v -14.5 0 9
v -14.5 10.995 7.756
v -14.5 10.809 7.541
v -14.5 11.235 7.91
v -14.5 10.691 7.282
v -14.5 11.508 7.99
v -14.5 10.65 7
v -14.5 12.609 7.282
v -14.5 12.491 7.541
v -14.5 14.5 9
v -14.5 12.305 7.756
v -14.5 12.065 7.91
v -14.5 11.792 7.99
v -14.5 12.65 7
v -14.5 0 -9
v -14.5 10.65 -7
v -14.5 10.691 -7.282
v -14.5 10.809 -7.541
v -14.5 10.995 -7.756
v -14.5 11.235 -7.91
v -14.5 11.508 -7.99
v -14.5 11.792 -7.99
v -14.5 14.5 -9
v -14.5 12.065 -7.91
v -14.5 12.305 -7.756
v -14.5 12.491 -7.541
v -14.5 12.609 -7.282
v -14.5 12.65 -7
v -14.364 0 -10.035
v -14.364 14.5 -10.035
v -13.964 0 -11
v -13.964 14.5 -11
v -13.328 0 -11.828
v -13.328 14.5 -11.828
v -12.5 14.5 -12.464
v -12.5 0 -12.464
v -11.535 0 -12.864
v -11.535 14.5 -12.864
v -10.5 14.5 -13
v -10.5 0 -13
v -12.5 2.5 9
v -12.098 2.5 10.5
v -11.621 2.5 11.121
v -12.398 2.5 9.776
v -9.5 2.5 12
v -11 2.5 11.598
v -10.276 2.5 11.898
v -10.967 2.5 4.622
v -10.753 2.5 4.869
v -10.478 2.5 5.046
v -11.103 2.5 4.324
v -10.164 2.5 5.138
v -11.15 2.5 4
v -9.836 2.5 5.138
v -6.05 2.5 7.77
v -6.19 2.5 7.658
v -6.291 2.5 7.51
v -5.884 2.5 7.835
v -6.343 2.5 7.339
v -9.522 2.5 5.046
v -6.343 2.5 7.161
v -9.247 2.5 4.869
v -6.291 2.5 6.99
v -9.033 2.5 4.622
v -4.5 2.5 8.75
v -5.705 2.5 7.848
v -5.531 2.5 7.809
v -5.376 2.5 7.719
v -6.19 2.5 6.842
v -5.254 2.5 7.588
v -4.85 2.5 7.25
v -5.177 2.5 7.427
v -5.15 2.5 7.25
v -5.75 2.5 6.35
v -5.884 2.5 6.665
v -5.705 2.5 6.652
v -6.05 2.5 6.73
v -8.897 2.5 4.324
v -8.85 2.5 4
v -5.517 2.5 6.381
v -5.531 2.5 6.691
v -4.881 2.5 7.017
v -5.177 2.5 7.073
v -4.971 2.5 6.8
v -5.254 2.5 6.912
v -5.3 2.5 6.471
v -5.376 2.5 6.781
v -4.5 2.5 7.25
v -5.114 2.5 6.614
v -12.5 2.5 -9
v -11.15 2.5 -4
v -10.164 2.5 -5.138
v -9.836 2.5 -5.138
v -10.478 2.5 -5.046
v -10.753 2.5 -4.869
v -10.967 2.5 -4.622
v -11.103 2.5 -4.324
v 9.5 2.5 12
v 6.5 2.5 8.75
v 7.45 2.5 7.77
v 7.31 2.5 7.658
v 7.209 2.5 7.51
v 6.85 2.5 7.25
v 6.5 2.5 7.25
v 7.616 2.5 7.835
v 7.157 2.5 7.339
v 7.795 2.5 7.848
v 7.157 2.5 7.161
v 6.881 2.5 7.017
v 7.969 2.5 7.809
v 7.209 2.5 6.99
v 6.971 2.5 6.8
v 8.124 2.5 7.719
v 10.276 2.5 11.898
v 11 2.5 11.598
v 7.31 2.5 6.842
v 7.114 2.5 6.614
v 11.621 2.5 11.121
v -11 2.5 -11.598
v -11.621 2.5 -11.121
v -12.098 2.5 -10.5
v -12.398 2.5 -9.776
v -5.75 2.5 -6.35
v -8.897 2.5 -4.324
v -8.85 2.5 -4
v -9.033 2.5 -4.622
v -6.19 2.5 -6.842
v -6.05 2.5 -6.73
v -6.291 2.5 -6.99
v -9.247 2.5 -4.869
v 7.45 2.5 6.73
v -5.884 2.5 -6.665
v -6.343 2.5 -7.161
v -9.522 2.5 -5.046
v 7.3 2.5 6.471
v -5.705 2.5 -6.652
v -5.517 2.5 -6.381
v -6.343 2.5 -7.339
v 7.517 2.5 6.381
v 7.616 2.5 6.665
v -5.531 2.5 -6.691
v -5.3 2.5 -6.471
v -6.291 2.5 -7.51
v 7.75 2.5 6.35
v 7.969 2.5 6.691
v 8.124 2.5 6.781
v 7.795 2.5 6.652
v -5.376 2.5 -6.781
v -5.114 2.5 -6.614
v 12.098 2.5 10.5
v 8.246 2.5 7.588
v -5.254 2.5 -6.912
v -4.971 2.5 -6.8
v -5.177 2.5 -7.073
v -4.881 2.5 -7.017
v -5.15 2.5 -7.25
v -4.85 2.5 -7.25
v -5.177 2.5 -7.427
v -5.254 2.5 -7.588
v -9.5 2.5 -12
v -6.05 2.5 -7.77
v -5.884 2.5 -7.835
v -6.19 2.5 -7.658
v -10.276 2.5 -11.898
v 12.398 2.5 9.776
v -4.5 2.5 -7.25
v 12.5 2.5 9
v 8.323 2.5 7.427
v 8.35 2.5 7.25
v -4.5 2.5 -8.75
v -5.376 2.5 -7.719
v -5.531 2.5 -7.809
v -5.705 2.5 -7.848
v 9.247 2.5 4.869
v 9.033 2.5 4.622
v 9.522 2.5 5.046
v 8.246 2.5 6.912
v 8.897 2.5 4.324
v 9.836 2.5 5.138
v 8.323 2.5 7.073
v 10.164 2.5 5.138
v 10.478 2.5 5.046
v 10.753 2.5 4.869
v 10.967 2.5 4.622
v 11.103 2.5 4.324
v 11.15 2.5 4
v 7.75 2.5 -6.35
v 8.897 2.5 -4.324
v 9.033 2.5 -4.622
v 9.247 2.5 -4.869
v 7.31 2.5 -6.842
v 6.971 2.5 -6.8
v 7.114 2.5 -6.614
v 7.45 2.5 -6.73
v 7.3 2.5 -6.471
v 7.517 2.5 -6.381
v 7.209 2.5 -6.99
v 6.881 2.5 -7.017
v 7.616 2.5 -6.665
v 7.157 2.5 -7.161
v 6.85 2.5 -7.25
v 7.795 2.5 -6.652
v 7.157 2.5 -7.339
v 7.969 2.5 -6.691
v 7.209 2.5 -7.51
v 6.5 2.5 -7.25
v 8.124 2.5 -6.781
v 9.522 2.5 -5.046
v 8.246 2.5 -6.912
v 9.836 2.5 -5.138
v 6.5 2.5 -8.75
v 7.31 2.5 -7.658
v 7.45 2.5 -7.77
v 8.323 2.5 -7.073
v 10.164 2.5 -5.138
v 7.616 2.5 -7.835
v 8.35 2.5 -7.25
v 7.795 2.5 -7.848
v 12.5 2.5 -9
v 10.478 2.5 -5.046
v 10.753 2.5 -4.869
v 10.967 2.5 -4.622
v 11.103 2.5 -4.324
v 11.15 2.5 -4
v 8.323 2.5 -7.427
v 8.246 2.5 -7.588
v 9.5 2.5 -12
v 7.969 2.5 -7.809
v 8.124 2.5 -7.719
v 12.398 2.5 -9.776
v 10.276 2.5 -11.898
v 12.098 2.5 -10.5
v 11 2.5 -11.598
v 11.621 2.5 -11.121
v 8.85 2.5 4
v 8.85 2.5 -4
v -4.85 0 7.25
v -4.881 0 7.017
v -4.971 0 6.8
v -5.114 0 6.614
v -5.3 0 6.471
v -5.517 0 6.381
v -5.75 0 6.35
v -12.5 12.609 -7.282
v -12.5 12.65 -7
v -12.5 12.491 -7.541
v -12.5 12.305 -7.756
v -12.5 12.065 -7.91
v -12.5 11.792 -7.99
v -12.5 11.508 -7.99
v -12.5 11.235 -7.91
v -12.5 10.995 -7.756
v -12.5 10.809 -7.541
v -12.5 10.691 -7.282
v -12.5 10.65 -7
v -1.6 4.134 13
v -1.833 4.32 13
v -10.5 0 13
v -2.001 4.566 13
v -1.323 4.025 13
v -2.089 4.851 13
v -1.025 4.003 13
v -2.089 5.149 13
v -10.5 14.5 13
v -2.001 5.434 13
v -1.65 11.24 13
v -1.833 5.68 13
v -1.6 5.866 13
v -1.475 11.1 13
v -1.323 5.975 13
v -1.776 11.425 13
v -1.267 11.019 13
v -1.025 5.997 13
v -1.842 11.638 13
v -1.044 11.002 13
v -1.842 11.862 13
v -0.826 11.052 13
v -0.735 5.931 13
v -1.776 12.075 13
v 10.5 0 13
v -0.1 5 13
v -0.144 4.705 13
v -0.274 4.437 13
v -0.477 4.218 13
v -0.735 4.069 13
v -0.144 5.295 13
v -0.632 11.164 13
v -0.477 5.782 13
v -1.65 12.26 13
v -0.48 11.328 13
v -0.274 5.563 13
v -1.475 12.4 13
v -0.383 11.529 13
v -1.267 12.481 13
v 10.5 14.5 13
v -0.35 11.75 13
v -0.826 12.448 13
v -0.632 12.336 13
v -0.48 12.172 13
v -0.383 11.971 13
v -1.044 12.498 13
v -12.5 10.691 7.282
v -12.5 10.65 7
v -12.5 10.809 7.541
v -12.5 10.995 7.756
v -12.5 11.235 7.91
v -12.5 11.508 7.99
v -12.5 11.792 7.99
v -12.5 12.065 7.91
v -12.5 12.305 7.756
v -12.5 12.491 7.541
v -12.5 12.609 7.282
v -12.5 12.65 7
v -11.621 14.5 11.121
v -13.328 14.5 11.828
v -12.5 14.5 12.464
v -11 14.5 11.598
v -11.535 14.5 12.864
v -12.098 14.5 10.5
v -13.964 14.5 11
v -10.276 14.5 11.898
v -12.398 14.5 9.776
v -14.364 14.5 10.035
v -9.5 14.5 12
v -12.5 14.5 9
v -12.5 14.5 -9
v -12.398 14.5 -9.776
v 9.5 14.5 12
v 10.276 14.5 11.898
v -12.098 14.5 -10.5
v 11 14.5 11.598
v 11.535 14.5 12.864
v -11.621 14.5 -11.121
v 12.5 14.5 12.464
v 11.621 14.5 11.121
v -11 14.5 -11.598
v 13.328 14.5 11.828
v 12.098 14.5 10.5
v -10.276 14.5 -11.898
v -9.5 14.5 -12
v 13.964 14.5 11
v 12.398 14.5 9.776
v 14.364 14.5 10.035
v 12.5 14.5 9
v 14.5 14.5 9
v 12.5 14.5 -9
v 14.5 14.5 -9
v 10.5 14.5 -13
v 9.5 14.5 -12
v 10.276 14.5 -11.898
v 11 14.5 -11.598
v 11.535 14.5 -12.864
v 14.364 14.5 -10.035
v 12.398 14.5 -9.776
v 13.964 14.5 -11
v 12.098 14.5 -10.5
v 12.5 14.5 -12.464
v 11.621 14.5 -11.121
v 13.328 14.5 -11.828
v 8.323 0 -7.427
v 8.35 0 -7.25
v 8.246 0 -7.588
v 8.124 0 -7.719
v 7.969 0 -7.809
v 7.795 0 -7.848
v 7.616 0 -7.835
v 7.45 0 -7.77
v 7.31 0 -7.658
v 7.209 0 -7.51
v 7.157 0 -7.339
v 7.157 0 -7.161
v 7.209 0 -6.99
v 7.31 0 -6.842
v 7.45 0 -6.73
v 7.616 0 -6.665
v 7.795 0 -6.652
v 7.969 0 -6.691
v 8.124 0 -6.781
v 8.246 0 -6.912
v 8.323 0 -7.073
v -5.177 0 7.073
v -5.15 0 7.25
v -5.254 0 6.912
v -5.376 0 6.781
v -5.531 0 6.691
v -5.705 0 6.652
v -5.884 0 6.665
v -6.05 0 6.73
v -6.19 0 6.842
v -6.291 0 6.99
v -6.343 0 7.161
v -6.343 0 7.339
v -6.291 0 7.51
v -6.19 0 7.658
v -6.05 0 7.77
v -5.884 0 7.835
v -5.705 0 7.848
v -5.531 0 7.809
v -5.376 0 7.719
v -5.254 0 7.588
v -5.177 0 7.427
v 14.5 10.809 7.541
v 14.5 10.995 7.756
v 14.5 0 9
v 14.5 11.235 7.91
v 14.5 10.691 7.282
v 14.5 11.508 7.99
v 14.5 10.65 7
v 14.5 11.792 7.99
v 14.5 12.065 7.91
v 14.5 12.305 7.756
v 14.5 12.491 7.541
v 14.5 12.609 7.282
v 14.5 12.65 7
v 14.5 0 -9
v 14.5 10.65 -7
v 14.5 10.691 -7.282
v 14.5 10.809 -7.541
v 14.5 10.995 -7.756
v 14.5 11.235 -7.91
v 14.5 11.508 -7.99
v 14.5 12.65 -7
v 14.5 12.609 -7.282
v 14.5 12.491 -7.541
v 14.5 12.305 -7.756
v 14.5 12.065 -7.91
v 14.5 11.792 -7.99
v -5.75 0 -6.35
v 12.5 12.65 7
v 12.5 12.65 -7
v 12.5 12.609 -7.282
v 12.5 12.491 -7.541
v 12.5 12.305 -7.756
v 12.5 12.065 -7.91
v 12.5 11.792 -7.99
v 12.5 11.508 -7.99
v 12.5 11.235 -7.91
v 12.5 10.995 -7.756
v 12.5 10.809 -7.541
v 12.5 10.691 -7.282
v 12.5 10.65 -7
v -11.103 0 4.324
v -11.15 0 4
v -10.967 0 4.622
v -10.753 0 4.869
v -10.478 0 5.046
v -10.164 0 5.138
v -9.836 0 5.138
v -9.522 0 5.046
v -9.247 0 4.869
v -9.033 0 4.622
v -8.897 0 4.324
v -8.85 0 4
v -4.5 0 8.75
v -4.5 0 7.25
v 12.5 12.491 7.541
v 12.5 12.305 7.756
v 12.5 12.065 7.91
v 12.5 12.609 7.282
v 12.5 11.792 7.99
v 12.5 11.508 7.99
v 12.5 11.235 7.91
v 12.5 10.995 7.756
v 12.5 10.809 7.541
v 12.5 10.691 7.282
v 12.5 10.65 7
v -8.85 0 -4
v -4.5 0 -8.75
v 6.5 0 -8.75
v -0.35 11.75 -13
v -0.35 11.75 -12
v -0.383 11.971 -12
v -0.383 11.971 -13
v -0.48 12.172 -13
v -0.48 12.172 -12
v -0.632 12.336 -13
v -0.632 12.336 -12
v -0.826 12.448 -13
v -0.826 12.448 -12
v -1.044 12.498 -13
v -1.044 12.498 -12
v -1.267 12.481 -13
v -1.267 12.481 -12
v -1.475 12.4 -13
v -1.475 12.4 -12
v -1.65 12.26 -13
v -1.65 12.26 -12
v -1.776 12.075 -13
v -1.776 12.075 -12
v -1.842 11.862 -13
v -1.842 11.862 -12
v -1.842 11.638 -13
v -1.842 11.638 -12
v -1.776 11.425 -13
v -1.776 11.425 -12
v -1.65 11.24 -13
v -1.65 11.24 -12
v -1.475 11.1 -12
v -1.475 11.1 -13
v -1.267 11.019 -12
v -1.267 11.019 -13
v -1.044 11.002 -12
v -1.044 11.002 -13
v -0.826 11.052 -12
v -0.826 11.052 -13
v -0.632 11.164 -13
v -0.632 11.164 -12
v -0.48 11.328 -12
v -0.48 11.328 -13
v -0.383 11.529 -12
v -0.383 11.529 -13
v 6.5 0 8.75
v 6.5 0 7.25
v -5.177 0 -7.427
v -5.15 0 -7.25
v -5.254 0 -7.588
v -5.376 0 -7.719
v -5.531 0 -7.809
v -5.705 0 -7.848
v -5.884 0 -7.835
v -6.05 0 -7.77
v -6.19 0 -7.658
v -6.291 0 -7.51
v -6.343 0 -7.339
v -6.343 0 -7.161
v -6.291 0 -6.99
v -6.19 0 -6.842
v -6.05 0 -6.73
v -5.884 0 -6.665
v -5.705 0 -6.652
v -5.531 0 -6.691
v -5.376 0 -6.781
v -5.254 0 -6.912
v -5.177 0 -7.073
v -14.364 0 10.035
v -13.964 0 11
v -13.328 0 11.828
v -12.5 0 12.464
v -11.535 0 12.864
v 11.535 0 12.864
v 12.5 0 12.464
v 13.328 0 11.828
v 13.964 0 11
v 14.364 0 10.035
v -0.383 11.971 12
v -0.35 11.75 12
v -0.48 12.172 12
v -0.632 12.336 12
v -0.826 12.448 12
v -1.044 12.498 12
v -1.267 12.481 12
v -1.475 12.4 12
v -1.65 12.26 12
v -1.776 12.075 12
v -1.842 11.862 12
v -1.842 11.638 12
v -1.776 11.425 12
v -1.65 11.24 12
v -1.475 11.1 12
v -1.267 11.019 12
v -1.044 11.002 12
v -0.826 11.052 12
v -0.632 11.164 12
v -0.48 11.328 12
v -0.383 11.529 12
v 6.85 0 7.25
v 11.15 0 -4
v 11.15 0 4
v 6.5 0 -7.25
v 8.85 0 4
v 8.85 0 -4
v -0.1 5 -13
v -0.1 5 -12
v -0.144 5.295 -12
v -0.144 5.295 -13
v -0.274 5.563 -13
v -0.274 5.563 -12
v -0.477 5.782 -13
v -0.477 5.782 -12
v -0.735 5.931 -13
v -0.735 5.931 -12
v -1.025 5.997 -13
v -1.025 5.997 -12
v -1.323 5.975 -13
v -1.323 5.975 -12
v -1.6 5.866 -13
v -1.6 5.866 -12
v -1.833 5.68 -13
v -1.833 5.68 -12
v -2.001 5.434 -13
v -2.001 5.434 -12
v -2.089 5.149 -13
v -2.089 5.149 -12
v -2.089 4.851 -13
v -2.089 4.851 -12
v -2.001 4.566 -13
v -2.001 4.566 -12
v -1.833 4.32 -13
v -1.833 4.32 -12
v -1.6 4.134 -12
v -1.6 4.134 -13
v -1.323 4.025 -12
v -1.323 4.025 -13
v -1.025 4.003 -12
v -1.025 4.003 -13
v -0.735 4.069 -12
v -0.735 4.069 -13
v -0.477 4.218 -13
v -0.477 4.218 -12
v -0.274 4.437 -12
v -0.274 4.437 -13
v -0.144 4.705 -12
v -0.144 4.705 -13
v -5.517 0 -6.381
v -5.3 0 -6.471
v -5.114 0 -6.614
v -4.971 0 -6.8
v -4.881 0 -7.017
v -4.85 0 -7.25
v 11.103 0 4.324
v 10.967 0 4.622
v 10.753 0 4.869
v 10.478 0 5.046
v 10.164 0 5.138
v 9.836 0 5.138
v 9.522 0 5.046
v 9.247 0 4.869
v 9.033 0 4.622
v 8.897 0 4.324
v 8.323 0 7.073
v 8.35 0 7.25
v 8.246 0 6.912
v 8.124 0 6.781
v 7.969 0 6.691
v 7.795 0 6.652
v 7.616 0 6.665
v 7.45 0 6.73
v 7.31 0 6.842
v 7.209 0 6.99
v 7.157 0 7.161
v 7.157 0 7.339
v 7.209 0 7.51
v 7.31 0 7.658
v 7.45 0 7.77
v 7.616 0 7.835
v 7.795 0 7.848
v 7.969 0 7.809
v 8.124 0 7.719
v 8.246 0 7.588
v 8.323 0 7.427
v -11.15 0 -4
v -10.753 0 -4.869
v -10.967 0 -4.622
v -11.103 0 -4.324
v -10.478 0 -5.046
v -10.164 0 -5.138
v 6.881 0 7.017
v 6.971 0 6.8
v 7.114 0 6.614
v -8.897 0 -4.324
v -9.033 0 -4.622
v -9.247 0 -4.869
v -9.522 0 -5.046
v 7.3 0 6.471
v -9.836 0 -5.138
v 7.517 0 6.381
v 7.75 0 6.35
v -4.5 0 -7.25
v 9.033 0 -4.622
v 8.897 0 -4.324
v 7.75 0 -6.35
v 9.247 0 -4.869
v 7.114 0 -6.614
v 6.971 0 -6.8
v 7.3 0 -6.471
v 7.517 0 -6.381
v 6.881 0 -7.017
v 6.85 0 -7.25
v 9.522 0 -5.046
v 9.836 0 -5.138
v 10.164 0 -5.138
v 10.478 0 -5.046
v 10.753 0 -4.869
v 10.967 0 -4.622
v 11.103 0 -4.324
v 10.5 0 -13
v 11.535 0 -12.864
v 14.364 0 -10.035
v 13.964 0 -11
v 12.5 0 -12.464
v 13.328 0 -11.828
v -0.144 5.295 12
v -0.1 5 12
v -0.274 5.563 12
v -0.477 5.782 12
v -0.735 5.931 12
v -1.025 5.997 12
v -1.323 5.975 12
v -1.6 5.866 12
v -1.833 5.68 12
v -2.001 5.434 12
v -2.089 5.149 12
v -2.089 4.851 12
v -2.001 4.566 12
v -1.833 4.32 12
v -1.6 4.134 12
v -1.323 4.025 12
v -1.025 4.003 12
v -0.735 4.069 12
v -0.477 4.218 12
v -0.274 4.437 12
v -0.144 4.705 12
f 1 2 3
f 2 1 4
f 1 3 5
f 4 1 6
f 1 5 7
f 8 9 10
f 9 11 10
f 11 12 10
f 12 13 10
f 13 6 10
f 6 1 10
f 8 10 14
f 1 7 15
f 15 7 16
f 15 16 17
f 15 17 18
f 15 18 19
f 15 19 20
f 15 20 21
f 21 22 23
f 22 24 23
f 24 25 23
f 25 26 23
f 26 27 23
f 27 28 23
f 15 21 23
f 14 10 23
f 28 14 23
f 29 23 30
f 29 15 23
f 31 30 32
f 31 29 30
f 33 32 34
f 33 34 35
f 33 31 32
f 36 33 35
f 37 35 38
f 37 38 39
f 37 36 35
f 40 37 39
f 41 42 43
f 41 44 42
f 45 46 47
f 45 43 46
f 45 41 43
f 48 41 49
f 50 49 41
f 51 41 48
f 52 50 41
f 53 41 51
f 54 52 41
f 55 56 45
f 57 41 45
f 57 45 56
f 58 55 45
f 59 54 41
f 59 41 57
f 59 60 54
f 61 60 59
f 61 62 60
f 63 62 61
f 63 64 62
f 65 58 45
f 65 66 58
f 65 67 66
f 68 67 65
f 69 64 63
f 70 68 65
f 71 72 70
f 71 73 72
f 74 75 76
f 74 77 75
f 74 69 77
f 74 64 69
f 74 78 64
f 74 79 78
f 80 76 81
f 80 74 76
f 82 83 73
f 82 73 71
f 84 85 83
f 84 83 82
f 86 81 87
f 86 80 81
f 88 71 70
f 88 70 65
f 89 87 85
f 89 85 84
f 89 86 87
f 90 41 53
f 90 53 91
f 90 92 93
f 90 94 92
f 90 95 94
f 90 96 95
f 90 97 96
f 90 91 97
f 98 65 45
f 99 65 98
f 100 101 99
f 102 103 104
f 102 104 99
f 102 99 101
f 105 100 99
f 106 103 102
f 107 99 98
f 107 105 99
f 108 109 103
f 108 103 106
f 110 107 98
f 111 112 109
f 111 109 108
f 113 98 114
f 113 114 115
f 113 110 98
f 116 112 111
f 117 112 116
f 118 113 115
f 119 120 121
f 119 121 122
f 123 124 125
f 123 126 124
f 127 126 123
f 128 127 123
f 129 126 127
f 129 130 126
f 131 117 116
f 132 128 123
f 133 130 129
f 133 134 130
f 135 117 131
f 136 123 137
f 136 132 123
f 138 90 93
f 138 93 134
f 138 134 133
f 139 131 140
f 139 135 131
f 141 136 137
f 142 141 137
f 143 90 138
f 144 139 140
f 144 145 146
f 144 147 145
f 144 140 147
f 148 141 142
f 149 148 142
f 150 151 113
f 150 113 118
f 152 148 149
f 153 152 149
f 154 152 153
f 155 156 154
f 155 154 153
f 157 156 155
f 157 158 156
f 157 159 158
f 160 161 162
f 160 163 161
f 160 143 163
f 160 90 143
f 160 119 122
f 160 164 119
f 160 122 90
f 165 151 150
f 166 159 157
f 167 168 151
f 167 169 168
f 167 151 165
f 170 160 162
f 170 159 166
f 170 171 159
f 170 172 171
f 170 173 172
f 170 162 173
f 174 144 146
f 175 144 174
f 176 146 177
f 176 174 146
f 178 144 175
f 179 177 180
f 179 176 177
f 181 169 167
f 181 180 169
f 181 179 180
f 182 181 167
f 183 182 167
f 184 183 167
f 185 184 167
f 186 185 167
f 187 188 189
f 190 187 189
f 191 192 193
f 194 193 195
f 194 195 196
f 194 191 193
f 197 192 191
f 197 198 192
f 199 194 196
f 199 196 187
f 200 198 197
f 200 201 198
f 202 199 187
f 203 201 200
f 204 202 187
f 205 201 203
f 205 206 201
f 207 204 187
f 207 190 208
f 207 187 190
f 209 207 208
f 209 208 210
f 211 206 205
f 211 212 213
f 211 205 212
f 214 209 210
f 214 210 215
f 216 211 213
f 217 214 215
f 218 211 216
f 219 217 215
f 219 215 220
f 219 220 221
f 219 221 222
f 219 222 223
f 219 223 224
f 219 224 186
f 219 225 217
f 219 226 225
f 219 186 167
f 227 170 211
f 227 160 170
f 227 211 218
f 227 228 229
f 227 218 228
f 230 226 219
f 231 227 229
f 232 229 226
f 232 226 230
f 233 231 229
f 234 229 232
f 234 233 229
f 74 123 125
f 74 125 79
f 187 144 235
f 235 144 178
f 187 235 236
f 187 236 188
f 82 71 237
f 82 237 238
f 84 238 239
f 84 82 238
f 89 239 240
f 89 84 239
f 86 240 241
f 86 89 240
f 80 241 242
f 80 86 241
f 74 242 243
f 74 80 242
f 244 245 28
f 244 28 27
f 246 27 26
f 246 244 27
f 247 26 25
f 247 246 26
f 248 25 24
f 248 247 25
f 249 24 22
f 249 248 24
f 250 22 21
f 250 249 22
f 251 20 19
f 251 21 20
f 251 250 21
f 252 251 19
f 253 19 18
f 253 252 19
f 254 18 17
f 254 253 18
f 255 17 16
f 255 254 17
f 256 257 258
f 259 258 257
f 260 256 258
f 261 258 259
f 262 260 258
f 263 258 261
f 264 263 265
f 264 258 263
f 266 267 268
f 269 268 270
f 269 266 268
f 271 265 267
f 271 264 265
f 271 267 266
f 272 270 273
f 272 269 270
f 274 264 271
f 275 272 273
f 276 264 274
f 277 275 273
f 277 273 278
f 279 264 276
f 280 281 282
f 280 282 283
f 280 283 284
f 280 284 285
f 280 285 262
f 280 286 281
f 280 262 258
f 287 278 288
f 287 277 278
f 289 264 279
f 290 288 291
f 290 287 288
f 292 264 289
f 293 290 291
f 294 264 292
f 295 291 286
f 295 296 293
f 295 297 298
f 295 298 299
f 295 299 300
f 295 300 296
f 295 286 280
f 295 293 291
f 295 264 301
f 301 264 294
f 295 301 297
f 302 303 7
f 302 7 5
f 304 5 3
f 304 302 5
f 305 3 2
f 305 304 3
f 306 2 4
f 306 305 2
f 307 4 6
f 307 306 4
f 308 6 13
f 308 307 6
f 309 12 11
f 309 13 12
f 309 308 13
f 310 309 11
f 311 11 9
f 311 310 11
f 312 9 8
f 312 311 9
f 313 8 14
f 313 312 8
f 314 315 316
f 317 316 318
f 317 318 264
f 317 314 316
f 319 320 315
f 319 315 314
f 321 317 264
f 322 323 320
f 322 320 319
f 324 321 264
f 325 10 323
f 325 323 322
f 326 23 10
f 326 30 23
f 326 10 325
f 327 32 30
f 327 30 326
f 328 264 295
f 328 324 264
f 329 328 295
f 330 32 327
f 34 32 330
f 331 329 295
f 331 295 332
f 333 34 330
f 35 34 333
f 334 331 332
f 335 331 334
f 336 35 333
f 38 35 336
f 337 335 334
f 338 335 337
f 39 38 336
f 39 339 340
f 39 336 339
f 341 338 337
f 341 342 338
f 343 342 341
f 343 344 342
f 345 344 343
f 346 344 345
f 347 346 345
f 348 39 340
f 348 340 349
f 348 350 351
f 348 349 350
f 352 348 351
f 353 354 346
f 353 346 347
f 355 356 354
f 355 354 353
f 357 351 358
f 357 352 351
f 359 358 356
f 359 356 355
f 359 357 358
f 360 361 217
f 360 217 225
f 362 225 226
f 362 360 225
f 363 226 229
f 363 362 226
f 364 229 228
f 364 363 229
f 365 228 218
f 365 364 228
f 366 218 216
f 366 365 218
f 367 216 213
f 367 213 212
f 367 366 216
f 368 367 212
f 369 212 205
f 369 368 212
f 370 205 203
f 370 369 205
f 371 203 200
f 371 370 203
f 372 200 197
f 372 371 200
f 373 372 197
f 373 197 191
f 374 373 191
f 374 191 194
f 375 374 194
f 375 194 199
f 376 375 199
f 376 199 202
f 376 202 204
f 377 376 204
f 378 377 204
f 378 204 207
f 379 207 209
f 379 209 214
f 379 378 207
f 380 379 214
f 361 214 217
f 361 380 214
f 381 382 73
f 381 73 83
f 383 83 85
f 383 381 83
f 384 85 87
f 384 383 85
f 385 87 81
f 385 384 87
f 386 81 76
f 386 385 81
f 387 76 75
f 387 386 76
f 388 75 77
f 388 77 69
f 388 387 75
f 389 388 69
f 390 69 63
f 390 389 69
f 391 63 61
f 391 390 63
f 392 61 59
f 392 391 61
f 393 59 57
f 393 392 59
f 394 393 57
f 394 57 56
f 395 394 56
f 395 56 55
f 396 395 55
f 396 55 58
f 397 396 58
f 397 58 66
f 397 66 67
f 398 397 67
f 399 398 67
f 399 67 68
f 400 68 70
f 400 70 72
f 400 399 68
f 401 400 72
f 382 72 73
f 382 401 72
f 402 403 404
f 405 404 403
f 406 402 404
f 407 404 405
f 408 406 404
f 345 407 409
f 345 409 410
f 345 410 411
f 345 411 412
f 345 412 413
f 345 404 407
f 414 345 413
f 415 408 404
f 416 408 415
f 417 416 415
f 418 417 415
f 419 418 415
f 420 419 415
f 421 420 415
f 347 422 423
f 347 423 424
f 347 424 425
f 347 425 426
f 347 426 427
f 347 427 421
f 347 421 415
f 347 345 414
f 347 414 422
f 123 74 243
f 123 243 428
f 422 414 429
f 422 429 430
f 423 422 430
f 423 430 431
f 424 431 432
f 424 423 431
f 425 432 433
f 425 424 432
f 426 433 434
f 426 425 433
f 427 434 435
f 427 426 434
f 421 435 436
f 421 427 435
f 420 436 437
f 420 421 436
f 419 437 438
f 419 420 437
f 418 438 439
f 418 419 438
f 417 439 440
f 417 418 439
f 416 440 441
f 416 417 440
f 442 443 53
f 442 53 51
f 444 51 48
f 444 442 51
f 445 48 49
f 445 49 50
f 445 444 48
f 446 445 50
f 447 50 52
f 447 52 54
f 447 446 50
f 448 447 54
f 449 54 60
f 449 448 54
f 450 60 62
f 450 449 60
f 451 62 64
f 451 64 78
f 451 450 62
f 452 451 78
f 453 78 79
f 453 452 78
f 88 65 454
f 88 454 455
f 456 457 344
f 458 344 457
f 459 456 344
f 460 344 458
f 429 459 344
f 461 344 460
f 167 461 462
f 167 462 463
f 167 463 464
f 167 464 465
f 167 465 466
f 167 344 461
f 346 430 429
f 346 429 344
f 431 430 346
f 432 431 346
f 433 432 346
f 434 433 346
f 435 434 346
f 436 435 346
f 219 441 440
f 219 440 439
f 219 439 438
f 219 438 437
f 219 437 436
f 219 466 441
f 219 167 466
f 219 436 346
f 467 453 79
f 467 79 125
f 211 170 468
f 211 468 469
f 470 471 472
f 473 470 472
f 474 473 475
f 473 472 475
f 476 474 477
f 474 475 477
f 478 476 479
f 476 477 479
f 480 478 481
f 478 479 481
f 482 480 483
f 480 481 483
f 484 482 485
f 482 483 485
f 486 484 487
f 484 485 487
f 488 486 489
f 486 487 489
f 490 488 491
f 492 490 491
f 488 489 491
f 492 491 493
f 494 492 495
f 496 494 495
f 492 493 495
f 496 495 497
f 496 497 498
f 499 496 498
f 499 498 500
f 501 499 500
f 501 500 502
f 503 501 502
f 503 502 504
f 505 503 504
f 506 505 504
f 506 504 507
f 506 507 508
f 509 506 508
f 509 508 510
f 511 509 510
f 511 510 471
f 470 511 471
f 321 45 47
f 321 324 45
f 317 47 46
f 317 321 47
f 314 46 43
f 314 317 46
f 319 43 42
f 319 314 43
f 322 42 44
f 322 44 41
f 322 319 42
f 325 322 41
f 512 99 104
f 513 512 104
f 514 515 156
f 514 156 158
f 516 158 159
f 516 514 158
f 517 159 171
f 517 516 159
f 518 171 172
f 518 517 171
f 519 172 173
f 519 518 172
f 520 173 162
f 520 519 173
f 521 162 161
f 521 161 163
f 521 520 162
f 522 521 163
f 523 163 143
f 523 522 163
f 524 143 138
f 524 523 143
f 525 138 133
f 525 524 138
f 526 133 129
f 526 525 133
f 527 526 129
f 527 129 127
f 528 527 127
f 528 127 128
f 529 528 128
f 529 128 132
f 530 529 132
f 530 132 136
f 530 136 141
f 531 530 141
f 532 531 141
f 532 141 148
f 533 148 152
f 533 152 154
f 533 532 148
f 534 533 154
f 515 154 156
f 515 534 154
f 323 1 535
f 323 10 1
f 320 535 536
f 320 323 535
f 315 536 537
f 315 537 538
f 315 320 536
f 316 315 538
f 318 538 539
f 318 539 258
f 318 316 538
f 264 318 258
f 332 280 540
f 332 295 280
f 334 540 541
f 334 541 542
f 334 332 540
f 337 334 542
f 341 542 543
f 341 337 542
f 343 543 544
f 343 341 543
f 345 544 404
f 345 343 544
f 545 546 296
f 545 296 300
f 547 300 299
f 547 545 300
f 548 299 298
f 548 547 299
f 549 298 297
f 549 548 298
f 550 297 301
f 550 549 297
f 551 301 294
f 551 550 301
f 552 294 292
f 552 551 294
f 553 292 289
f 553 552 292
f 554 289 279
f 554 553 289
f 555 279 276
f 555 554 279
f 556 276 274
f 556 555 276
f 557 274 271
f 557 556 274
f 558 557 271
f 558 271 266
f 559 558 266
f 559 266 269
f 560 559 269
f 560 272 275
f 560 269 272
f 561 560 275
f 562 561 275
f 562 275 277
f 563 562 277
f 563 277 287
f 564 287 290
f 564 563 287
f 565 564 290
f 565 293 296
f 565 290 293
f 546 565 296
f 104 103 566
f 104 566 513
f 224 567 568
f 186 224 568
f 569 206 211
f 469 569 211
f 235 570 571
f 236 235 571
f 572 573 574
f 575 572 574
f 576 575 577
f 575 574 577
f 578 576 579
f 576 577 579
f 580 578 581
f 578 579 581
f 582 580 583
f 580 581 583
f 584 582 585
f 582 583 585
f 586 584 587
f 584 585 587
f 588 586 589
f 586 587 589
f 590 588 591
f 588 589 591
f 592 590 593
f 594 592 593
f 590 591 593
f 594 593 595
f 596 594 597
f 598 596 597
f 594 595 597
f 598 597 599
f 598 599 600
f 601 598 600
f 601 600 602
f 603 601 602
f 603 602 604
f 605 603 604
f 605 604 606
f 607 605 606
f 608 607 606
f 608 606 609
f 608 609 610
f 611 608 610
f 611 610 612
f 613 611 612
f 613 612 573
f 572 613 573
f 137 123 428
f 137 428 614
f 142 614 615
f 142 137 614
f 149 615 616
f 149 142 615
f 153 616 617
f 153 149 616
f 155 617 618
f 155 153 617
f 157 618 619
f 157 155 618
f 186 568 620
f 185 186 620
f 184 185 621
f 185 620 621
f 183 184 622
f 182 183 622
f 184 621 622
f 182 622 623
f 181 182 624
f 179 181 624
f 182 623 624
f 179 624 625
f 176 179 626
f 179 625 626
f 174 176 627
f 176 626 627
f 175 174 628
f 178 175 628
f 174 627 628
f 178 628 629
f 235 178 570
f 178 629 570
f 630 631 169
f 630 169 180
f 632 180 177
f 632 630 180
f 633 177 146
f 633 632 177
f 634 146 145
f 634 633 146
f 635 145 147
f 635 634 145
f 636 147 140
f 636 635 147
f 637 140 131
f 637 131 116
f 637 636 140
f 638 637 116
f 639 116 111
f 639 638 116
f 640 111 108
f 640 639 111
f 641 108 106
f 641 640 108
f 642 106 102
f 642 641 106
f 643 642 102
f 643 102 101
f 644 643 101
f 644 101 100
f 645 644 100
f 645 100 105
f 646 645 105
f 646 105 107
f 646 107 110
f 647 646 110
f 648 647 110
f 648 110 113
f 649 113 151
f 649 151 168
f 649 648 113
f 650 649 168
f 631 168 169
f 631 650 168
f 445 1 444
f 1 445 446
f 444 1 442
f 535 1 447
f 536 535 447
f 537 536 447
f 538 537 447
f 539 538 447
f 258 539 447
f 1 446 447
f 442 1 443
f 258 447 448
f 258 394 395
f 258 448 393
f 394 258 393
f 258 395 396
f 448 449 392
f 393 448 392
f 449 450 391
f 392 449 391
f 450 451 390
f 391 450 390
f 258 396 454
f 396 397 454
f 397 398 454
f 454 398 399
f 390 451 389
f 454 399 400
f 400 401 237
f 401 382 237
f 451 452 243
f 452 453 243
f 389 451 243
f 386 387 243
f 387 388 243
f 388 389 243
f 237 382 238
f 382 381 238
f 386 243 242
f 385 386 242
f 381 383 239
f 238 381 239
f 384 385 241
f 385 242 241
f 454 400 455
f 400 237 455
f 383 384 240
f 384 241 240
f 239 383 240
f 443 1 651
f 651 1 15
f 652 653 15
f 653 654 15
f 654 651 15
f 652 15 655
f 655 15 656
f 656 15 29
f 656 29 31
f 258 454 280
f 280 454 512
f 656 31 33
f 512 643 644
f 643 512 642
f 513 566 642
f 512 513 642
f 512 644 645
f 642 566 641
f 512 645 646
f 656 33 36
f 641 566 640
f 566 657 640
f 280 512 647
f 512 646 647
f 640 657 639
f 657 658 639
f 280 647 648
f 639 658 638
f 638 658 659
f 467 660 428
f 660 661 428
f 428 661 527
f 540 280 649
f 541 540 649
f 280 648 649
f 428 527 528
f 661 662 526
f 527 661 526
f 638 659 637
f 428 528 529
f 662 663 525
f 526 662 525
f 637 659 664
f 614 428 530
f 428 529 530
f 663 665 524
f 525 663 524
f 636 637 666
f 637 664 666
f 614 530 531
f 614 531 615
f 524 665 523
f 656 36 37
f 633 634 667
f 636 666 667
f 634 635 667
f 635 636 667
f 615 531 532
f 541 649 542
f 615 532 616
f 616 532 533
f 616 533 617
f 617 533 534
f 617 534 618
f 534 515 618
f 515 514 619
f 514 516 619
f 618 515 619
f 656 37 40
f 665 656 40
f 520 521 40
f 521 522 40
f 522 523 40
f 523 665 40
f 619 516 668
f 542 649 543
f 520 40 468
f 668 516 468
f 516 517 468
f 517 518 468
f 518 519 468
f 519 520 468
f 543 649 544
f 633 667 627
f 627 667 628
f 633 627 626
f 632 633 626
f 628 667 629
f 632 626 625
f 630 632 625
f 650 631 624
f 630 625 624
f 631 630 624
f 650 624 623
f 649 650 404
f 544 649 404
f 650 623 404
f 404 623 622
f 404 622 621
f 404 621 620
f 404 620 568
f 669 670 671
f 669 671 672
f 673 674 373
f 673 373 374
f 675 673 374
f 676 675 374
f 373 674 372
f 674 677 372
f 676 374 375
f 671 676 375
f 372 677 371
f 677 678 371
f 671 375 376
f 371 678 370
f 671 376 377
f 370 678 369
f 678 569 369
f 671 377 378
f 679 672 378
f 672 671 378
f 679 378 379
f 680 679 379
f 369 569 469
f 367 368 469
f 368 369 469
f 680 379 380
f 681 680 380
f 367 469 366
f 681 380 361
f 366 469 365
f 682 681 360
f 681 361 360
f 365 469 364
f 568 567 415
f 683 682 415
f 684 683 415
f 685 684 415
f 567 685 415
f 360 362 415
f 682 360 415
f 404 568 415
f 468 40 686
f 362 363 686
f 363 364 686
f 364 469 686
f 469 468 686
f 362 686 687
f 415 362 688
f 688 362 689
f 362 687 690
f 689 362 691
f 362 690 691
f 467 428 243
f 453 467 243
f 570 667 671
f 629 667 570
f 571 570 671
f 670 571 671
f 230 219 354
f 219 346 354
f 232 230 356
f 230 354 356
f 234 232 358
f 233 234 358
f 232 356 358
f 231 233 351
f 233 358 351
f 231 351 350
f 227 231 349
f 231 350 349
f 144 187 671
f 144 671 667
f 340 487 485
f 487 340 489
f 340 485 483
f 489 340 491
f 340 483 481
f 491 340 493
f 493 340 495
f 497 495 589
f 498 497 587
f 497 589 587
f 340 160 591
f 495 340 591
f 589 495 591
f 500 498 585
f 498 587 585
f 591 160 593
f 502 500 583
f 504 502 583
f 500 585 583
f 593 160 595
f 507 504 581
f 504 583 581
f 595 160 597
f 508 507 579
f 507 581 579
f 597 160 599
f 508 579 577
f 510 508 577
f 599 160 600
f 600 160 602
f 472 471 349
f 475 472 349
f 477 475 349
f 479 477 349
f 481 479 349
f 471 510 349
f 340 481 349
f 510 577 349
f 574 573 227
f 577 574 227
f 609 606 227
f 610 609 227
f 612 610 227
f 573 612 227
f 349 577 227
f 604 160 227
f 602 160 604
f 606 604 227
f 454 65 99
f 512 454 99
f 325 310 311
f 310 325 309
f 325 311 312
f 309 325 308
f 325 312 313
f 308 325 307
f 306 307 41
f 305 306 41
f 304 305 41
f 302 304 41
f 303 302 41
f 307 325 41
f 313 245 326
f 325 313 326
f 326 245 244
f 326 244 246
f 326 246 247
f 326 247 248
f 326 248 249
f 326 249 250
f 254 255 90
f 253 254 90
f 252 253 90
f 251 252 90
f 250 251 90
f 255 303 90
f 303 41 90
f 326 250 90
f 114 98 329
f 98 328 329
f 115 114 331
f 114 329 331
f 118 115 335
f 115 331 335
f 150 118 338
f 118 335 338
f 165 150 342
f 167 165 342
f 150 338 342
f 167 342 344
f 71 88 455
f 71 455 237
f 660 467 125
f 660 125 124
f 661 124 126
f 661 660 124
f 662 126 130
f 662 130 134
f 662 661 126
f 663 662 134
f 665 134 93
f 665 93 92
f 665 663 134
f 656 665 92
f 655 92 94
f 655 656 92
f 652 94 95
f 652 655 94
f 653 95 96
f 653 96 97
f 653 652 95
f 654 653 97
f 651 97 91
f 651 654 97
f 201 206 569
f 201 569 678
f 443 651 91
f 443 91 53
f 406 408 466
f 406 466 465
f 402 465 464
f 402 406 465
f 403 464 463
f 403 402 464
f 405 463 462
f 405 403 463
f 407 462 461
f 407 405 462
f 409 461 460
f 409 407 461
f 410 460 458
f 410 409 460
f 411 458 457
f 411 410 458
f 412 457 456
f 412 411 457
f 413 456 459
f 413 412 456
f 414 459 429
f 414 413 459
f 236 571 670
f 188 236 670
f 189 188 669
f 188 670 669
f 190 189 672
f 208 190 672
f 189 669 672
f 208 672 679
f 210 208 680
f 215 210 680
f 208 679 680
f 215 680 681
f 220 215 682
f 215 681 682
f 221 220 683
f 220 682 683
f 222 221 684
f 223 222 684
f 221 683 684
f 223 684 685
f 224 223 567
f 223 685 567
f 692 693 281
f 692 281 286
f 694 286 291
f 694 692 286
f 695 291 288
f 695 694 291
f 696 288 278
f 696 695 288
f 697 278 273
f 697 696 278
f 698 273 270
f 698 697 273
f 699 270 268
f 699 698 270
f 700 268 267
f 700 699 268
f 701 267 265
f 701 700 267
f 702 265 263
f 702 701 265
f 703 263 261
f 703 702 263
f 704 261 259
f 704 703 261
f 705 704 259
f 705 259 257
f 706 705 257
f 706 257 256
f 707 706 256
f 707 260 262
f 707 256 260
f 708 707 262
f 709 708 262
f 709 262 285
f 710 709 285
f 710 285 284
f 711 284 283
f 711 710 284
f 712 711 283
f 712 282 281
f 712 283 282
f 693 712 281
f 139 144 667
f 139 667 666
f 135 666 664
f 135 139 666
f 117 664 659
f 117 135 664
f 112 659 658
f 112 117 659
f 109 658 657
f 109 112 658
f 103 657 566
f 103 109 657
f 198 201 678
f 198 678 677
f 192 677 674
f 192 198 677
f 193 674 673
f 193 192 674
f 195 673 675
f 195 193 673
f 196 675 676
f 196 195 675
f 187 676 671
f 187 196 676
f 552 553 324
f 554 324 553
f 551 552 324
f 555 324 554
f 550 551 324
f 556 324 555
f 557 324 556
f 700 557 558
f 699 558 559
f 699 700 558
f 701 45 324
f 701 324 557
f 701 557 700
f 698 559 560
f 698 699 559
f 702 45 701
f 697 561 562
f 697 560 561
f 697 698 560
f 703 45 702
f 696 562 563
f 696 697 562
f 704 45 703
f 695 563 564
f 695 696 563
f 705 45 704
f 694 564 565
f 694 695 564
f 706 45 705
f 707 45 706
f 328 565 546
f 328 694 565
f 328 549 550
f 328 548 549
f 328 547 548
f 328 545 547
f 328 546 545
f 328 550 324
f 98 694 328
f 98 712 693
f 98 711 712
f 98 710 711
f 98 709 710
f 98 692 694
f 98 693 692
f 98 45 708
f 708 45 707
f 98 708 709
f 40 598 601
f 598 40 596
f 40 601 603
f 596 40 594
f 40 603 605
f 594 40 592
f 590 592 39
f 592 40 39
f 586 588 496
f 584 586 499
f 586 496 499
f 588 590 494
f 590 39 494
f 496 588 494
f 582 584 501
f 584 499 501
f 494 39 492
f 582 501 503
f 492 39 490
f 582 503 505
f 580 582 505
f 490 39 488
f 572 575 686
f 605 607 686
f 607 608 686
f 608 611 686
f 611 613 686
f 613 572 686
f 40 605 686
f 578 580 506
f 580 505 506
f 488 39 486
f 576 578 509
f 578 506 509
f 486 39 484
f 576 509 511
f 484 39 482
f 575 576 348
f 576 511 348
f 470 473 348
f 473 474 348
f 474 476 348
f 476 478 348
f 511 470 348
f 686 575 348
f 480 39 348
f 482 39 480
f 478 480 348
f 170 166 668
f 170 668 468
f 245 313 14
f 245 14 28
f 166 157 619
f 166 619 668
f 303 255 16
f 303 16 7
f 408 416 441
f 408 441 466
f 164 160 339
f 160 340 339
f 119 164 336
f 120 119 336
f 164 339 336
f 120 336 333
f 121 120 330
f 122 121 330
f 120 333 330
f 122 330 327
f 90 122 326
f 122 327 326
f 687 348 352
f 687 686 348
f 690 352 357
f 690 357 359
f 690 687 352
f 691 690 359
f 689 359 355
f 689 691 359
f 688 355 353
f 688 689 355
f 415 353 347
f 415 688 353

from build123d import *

# Parameters (mm, degrees)
SKETCH1_W                = 25
SKETCH1_H                = 24
SKETCH1_R                = 0.6
BOSS_EXTRUDE1_DEPTH      = 2.5
CUT_EXTRUDE1_DEPTH       = 3.5
SKETCH8_W                = 11
SKETCH8_H                = 17.5
CUT_EXTRUDE4_DEPTH       = 3.5
SKETCH2_W                = 29
SKETCH2_H                = 26
SKETCH2_W_2              = 25
SKETCH2_H_2              = 24
BOSS_EXTRUDE2_DEPTH      = 12
BOSS_EXTRUDE2_DEPTH_BACK = 2.5
SKETCH5_R                = 0.75
SKETCH5_R_2              = 1
CUT_EXTRUDE2_DEPTH       = 26
CUT_EXTRUDE2_DEPTH_BACK  = 2
FILLET1_R                = 3
FILLET2_R                = 4
CUT_EXTRUDE5_DEPTH       = 30


with BuildPart() as part:
    # Sketch1 → Boss-Extrude1 (new body)
    with BuildSketch(Plane(origin=(0, 0, 0), x_dir=(1, 0, 0), z_dir=(0, 1, 0))):
        Rectangle(SKETCH1_W, SKETCH1_H)
        with Locations((7.75, 7.25)):
            Circle(SKETCH1_R, mode=Mode.SUBTRACT)
        with Locations((7.75, -7.25)):
            Circle(SKETCH1_R, mode=Mode.SUBTRACT)
        with Locations((-5.75, -7.25)):
            Circle(SKETCH1_R, mode=Mode.SUBTRACT)
        with Locations((-5.75, 7.25)):
            Circle(SKETCH1_R, mode=Mode.SUBTRACT)
        with BuildLine():
            Line((8.85, -4), (8.85, 4))
            ThreePointArc((8.85, 4), (10, 5.15), (11.15, 4))
            Line((11.15, 4), (11.15, -4))
            ThreePointArc((11.15, -4), (10, -5.15), (8.85, -4))
        make_face(mode=Mode.SUBTRACT)
        with BuildLine():
            Line((-8.85, -4), (-8.85, 4))
            ThreePointArc((-8.85, 4), (-10, 5.15), (-11.15, 4))
            Line((-11.15, 4), (-11.15, -4))
            ThreePointArc((-11.15, -4), (-10, -5.15), (-8.85, -4))
        make_face(mode=Mode.SUBTRACT)
    extrude(amount=BOSS_EXTRUDE1_DEPTH)

    # Sketch3 → Cut-Extrude1 (cut, through all)
    with BuildSketch(Plane(origin=(0, 2.5, 0), x_dir=(1, 0, 0), z_dir=(0, 1, 0))):
        with BuildLine():
            Line((-4.85, 7.25), (6.85, 7.25))
            ThreePointArc((6.85, 7.25), (7.113603897, 6.613603897), (7.75, 6.35))
            Line((7.75, 6.35), (7.75, -6.35))
            ThreePointArc((7.75, -6.35), (7.113603897, -6.613603897), (6.85, -7.25))
            Line((6.85, -7.25), (-4.85, -7.25))
            ThreePointArc((-4.85, -7.25), (-5.113603897, -6.613603897), (-5.75, -6.35))
            Line((-5.75, -6.35), (-5.75, 6.35))
            ThreePointArc((-5.75, 6.35), (-5.113603897, 6.613603897), (-4.85, 7.25))
        make_face()
    extrude(amount=-CUT_EXTRUDE1_DEPTH, mode=Mode.SUBTRACT)

    # Sketch8 → Cut-Extrude4 (cut, through all)
    with BuildSketch(Plane(origin=(0, 2.5, 0), x_dir=(1, 0, 0), z_dir=(0, 1, 0))):
        with Locations((1, 0)):
            Rectangle(SKETCH8_W, SKETCH8_H)
    extrude(amount=-CUT_EXTRUDE4_DEPTH, mode=Mode.SUBTRACT)

    # Sketch2 → Boss-Extrude2 (add, two sides)
    with BuildSketch(Plane(origin=(0, 2.5, 0), x_dir=(1, 0, 0), z_dir=(0, 1, 0))) as boss_extrude2_sk:
        Rectangle(SKETCH2_W, SKETCH2_H)
        Rectangle(SKETCH2_W_2, SKETCH2_H_2, mode=Mode.SUBTRACT)
    extrude(amount=BOSS_EXTRUDE2_DEPTH)
    extrude(boss_extrude2_sk.sketch, amount=-BOSS_EXTRUDE2_DEPTH_BACK)

    # Sketch5 → Cut-Extrude2 (cut, two sides)
    with BuildSketch(Plane.XY.offset(-12)) as cut_extrude2_sk:
        with Locations((-1.1, 11.75)):
            Circle(SKETCH5_R)
        with Locations((-1.1, 5)):
            Circle(SKETCH5_R_2)
    extrude(amount=CUT_EXTRUDE2_DEPTH, mode=Mode.SUBTRACT)
    extrude(cut_extrude2_sk.sketch, amount=-CUT_EXTRUDE2_DEPTH_BACK, mode=Mode.SUBTRACT)

    # Fillet1
    fillet1_edges = [part.edges().sort_by_distance(p)[0] for p in [
        (12.5, 8.5, 12),
        (-12.5, 8.5, -12),
        (12.5, 8.5, -12),
        (-12.5, 8.5, 12),
    ]]
    fillet(fillet1_edges, radius=FILLET1_R)

    # Fillet2
    fillet2_edges = [part.edges().sort_by_distance(p)[0] for p in [
        (-14.5, 7.25, 13),
        (14.5, 7.25, 13),
        (14.5, 7.25, -13),
        (-14.5, 7.25, -13),
    ]]
    fillet(fillet2_edges, radius=FILLET2_R)

    # Sketch9 → Cut-Extrude5 (cut, through all)
    with BuildSketch(Plane(origin=(14.5, 0, 0), x_dir=(0, 0, -1), z_dir=(1, 0, 0))):
        with BuildLine():
            Line((-7, 12.65), (7, 12.65))
            ThreePointArc((7, 12.65), (8, 11.65), (7, 10.65))
            Line((7, 10.65), (-7, 10.65))
            ThreePointArc((-7, 10.65), (-8, 11.65), (-7, 12.65))
        make_face()
    extrude(amount=-CUT_EXTRUDE5_DEPTH, mode=Mode.SUBTRACT)


solid = part.part
